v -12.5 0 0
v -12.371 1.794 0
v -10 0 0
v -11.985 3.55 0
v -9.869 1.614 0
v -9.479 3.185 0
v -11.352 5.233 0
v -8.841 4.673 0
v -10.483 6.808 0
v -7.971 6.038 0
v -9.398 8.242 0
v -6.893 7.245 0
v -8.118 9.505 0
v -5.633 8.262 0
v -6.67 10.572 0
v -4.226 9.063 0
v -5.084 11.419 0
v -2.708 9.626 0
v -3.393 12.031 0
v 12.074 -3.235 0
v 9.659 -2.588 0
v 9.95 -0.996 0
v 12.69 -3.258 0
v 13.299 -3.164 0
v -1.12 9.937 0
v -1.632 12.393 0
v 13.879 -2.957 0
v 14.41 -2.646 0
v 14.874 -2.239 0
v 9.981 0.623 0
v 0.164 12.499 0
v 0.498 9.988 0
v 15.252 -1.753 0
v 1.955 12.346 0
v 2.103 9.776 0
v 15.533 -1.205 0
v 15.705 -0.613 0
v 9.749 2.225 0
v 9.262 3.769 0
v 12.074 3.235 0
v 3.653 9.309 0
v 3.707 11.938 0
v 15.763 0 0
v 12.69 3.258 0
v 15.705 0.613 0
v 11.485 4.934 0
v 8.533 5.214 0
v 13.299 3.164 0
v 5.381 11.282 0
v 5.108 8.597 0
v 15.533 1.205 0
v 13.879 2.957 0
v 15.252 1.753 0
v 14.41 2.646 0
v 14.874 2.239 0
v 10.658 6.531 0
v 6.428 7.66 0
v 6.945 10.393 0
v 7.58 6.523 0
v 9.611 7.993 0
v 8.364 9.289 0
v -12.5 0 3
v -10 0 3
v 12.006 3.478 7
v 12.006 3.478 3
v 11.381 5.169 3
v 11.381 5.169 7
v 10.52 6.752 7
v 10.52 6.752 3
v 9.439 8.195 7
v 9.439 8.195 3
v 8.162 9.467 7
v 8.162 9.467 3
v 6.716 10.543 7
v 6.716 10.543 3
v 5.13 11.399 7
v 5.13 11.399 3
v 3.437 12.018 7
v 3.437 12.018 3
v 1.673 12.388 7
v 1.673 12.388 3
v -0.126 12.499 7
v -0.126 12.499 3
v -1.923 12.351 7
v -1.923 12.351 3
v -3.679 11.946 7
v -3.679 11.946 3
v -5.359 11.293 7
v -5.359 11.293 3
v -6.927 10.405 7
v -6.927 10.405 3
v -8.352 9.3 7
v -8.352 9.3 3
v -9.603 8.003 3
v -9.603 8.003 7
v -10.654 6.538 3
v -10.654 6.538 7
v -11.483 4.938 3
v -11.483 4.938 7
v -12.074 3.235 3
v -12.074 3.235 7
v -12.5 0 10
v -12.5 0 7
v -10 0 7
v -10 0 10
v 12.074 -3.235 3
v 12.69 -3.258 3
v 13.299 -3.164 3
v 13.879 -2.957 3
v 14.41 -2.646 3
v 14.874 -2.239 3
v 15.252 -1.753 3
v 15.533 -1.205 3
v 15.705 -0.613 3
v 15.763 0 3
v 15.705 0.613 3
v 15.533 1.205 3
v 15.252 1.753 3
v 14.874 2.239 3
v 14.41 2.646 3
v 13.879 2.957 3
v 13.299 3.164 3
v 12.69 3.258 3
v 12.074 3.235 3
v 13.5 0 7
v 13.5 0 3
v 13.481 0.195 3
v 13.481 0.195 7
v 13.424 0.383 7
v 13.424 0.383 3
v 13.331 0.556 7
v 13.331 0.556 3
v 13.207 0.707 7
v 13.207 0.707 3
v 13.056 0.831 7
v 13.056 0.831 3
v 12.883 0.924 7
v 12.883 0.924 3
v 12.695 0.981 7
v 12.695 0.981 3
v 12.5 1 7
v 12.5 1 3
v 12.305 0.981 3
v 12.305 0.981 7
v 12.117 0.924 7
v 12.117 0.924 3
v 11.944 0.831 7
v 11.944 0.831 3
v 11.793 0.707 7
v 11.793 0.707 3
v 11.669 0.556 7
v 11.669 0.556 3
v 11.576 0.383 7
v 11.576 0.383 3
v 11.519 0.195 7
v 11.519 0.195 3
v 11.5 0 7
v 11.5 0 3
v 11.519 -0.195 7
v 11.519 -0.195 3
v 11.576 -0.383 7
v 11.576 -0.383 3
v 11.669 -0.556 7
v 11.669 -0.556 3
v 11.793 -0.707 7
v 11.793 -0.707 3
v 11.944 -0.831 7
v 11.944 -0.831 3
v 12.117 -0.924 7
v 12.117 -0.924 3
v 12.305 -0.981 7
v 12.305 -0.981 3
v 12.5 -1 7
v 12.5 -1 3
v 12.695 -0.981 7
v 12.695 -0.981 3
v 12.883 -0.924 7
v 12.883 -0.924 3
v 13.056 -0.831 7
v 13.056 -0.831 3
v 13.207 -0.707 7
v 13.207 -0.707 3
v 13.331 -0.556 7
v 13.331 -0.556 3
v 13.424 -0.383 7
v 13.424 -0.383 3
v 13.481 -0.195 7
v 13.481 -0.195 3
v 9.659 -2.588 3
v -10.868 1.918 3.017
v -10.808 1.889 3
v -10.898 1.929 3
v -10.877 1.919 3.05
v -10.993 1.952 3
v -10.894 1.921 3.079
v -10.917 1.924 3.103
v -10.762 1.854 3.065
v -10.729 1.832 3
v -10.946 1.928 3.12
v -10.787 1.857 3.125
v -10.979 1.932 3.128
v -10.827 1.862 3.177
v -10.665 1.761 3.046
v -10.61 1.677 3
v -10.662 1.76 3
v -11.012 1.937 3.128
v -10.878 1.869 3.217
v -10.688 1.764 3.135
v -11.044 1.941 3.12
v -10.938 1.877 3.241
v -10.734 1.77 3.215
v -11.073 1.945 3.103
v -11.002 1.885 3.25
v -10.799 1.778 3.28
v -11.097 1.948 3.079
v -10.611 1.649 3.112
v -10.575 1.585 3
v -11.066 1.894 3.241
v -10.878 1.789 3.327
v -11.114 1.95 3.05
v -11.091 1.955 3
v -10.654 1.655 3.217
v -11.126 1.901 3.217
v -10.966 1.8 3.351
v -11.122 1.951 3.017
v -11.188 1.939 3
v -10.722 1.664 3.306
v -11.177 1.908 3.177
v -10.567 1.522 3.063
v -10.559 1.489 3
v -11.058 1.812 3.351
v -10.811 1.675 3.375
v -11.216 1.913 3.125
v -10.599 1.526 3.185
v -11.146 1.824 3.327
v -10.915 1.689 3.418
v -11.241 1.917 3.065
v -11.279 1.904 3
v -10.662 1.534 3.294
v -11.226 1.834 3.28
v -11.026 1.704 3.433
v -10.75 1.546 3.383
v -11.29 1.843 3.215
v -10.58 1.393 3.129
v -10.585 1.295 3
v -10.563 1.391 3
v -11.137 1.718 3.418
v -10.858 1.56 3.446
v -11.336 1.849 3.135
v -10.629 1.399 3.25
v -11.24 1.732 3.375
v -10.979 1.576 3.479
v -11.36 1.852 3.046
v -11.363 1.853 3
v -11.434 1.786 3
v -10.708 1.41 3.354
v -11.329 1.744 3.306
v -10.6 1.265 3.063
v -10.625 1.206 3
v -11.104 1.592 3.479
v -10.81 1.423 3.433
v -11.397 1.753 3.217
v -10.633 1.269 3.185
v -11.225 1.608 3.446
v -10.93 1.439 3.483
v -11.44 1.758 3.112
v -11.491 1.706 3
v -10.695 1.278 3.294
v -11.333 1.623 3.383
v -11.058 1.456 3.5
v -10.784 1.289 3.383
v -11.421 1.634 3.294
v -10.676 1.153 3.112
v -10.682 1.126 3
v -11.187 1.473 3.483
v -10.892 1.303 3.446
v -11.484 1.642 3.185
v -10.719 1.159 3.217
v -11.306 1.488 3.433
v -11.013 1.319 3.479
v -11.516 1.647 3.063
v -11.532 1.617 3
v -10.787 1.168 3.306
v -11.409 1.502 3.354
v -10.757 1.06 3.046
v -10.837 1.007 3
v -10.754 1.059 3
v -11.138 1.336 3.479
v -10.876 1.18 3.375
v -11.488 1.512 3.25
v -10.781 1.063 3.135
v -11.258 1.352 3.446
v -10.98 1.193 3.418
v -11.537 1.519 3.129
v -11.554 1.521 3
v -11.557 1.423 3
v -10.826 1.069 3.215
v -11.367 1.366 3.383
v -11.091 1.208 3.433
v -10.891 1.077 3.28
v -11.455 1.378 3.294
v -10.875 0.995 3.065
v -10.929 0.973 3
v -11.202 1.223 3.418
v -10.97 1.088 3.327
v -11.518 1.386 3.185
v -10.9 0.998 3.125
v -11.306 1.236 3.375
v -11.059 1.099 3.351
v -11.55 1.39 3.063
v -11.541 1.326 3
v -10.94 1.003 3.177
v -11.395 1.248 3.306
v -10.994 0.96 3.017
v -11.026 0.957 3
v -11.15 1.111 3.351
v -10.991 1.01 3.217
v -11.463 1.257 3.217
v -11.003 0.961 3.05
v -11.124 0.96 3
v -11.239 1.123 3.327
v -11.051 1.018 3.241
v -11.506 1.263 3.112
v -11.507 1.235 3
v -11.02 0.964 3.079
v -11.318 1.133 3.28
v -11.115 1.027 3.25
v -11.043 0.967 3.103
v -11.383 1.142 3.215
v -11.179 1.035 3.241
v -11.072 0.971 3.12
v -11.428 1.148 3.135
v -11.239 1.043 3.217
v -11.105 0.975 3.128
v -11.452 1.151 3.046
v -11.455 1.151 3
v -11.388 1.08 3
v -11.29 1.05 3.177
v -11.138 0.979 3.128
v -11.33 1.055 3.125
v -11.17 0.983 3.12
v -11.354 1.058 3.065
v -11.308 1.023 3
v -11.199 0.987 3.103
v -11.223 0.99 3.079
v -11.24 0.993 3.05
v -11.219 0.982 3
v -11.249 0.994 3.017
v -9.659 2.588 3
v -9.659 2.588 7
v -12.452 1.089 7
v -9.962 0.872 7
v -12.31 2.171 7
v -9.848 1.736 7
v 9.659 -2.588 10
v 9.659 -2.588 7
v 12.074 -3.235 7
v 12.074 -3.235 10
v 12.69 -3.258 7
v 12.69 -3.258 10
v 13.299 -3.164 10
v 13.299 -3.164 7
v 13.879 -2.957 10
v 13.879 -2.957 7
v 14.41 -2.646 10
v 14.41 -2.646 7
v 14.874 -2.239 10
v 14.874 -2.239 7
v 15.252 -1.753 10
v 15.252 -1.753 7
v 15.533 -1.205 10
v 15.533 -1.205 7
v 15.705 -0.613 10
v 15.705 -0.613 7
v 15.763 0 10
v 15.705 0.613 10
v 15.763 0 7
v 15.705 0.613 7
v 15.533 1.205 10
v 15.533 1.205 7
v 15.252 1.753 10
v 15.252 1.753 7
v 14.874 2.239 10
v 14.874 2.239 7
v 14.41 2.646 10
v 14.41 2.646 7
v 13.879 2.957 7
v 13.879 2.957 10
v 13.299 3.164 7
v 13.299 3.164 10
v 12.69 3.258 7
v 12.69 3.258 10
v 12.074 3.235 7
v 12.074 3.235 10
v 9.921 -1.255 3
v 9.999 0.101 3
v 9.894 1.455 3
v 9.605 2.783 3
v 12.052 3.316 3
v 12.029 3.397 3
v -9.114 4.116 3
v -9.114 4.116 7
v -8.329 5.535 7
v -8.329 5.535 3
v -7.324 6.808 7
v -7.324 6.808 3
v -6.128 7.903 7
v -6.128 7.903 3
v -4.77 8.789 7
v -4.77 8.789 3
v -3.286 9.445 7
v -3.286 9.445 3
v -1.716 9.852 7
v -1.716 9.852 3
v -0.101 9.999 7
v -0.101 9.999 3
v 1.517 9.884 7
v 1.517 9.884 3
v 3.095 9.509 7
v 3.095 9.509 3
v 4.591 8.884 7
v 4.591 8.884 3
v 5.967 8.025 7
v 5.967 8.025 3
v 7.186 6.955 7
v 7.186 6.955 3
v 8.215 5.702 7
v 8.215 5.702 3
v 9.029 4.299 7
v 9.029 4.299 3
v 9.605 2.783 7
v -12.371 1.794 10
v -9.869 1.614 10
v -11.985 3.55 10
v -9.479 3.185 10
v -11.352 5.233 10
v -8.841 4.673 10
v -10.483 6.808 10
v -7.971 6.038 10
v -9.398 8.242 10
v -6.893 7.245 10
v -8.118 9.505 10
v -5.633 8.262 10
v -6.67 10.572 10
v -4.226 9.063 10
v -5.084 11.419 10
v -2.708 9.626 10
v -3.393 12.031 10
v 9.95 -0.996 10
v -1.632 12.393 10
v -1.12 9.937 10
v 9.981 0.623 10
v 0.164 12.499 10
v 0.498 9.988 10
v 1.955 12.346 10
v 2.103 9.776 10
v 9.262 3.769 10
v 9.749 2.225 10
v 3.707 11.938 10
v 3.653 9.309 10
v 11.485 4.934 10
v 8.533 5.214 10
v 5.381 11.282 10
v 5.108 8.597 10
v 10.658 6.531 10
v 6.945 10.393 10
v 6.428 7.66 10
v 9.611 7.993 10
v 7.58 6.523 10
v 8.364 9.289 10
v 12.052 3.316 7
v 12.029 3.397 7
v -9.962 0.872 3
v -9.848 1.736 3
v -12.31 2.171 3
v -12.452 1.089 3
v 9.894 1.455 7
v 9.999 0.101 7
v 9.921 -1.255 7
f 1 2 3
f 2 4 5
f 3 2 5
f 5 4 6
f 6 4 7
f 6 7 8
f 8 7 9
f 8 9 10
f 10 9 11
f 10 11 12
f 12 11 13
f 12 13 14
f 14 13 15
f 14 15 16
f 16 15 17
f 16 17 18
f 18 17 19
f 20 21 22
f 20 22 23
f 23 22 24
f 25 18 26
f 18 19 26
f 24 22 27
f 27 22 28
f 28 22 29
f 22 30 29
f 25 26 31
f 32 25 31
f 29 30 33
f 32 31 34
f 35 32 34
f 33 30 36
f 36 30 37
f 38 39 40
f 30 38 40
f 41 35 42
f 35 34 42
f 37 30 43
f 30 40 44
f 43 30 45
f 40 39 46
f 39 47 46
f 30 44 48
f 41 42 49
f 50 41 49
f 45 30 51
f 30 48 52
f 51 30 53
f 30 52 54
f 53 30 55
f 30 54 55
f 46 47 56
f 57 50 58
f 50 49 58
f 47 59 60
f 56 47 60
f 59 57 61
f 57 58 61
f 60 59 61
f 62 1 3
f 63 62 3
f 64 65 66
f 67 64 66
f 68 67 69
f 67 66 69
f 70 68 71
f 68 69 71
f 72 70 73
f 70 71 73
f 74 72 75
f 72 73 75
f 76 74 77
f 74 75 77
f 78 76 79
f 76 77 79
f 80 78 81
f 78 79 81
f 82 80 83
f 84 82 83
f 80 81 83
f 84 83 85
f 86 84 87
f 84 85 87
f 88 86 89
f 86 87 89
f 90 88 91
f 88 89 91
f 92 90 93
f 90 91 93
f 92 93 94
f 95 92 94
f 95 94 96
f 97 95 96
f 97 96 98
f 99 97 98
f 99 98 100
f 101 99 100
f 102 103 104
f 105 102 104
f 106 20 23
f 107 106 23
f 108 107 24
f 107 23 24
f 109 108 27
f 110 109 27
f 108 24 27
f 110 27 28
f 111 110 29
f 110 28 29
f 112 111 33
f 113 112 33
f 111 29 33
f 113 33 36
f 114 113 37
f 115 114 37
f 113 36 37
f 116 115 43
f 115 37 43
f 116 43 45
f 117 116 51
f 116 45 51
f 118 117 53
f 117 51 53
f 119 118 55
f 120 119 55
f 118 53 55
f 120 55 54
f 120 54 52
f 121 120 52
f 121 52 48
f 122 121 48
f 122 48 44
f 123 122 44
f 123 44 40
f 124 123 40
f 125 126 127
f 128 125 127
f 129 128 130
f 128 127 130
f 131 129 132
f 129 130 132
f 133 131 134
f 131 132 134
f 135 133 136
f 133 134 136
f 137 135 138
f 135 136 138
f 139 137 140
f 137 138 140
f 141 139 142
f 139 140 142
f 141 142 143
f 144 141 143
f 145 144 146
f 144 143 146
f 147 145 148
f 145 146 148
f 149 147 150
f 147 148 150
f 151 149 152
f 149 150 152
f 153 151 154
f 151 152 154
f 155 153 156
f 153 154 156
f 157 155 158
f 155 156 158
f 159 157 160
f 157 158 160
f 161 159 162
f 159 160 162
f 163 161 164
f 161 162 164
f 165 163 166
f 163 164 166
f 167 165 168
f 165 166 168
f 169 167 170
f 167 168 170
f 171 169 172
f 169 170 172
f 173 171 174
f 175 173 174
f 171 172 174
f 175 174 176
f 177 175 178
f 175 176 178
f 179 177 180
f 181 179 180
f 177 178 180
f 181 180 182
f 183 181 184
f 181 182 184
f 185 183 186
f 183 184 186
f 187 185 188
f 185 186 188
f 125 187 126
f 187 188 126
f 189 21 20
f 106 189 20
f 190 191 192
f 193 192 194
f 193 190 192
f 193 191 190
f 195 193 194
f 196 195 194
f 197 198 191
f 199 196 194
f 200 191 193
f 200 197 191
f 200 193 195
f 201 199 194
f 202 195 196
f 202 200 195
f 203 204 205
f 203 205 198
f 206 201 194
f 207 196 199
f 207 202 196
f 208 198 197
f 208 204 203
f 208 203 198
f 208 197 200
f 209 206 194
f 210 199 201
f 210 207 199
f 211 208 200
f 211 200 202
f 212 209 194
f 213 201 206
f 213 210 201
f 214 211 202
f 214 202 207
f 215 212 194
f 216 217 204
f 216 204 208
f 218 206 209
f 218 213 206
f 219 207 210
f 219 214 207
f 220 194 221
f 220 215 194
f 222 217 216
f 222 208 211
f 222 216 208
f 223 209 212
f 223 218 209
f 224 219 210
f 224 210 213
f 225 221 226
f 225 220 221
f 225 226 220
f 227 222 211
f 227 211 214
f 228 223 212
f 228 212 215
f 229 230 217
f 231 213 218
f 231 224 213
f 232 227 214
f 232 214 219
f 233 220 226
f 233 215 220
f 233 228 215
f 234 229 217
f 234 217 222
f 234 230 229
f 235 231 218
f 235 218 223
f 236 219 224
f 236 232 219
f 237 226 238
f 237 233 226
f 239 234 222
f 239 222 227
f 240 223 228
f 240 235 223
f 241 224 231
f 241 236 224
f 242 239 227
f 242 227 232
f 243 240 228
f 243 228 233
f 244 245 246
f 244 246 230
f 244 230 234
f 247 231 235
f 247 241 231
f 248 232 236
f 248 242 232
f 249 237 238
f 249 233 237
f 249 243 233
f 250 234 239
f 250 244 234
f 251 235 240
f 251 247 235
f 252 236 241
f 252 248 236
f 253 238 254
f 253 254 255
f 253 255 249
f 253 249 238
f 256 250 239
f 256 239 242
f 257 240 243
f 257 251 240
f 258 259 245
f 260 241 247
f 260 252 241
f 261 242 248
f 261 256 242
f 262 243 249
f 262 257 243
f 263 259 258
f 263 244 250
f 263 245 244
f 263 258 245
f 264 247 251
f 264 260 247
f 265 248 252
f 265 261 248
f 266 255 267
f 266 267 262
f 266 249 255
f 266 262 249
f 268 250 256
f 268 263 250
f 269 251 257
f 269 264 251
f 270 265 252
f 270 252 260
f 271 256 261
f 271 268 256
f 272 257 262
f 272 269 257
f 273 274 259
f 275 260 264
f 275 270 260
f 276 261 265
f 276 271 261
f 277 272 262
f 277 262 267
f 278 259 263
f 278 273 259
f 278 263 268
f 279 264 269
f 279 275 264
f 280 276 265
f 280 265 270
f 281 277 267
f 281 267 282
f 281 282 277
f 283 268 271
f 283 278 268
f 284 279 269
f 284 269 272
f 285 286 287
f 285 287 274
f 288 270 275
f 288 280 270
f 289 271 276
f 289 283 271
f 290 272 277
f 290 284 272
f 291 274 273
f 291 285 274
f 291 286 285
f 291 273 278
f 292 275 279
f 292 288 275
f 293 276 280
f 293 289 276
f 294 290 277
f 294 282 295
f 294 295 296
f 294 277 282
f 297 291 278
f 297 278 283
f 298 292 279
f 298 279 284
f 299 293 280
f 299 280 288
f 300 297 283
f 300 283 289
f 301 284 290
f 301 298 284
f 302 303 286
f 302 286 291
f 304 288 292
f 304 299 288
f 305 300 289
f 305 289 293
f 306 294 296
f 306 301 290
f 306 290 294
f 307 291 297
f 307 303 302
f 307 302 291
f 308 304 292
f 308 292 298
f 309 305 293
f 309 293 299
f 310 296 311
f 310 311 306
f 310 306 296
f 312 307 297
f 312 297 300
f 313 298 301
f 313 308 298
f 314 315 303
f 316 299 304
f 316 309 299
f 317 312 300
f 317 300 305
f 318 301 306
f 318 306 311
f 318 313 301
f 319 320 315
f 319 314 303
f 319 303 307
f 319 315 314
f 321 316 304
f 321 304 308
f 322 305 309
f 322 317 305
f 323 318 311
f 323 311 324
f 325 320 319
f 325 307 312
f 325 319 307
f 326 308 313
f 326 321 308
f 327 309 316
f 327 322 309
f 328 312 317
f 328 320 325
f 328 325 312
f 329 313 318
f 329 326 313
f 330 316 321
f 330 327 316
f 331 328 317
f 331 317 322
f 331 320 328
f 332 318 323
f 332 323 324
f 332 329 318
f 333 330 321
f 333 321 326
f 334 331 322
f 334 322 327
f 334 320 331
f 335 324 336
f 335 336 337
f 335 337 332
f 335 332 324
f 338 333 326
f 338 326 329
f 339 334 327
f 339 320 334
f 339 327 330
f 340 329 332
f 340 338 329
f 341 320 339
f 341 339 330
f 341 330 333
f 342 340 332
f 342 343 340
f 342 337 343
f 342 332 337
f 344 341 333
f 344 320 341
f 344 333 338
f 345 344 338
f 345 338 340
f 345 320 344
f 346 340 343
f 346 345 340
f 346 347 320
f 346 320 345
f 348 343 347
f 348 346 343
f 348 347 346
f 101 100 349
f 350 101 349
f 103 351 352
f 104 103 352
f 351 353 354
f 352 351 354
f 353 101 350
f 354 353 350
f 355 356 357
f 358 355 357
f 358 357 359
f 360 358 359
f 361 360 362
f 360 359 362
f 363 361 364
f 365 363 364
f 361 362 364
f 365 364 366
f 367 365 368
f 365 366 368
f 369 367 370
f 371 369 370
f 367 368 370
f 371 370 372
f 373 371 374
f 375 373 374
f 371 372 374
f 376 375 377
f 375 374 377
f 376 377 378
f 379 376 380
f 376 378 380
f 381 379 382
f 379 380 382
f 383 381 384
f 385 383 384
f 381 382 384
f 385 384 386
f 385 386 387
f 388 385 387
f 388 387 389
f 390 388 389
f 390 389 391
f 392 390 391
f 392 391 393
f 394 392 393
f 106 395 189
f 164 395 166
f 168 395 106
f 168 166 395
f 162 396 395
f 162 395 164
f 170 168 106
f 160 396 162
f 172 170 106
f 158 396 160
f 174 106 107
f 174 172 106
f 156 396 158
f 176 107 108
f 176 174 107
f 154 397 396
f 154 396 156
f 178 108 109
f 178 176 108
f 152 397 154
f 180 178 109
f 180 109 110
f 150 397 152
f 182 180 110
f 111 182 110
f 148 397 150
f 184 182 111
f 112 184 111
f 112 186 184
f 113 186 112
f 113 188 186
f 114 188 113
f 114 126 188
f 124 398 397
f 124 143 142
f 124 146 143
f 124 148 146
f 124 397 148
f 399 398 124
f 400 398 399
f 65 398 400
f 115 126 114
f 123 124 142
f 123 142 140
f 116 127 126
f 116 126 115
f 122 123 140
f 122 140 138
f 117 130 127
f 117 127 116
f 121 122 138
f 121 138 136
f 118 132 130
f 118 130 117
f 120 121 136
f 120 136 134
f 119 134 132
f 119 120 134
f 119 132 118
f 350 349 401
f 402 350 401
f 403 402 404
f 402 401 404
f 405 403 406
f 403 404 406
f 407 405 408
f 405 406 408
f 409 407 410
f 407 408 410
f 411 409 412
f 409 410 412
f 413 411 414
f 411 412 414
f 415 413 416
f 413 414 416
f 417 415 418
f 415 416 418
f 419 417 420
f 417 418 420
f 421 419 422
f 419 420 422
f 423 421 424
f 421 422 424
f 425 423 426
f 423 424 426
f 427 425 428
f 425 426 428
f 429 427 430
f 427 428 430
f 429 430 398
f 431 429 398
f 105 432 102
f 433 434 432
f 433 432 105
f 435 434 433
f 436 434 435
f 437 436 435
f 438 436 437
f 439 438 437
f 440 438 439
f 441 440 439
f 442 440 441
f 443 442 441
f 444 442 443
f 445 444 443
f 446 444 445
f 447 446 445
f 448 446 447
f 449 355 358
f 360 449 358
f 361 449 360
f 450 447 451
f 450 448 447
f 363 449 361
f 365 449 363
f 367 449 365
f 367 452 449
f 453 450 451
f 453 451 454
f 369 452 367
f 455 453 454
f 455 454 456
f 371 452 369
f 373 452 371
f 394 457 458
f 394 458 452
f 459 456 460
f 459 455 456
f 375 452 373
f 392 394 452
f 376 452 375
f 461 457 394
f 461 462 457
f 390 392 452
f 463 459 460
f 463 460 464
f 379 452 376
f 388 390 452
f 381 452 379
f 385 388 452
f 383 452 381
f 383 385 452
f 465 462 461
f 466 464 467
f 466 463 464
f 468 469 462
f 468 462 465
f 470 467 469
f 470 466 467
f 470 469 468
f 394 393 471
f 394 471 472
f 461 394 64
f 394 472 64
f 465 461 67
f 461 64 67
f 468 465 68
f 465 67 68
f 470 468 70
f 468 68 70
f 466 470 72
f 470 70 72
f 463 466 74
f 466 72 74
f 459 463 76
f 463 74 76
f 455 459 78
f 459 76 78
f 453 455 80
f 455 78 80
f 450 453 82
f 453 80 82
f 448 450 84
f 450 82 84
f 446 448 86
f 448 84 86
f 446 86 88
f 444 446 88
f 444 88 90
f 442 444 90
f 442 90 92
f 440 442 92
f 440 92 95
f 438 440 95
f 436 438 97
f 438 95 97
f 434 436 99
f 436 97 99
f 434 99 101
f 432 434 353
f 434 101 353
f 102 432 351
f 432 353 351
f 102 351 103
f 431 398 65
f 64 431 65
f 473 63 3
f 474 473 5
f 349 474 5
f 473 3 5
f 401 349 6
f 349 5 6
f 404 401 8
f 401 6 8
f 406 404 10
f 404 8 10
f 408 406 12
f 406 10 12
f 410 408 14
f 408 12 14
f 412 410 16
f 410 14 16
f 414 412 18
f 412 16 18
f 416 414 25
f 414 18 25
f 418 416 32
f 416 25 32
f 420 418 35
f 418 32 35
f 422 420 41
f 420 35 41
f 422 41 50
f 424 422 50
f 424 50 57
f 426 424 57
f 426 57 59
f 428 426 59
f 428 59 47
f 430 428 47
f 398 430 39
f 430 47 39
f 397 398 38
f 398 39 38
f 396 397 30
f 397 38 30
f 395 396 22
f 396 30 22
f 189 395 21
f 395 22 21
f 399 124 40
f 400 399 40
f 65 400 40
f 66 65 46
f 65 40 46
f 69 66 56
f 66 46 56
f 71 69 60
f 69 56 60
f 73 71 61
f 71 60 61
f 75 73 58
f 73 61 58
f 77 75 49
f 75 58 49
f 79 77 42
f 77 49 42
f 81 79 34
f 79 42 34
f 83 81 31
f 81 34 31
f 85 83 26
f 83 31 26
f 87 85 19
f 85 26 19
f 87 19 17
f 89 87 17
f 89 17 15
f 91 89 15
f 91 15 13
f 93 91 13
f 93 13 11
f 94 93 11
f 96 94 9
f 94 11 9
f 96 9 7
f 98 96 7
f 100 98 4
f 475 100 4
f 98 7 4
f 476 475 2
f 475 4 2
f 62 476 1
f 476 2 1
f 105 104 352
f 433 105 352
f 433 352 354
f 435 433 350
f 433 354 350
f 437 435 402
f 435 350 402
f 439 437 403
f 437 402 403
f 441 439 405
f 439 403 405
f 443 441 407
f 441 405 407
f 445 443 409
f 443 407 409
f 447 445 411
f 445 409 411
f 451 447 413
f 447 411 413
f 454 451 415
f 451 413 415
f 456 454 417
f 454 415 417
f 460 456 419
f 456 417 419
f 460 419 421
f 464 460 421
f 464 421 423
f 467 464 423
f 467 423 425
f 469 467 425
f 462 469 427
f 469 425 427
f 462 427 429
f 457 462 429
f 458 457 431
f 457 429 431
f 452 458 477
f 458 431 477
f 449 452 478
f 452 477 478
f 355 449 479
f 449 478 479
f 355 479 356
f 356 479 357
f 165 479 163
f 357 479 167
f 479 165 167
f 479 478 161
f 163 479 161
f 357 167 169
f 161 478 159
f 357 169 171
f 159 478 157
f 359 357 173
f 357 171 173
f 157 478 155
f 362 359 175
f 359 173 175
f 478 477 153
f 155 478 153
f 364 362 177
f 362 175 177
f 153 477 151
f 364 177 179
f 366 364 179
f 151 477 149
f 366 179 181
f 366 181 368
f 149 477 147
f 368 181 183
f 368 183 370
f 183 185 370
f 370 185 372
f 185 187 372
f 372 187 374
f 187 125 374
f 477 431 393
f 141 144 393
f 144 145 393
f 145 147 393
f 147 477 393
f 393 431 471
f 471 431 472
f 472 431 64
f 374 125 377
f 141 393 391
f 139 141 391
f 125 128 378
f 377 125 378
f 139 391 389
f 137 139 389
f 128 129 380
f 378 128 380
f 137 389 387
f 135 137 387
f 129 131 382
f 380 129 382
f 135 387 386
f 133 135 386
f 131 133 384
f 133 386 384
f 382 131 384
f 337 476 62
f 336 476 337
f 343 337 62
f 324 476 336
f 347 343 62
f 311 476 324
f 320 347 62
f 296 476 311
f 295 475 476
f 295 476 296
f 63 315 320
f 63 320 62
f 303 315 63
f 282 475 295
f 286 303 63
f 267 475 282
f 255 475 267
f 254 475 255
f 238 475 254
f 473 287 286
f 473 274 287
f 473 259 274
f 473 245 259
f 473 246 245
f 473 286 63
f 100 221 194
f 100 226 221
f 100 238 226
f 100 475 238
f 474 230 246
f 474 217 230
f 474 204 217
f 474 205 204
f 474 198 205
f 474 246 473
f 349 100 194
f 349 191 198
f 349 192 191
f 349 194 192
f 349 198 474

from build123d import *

# Parameters (mm, degrees)
F1_DEPTH = 3
F2_R     = 1
F3_DEPTH = 4
F5_DEPTH = 3


with BuildPart() as f1:
    # F0 (on Top) → F1 (new body)
    with BuildSketch(Plane.XY):
        with BuildLine():
            Line((9.6592582629, -2.588190451), (12.0740728286, -3.2352380638))
            ThreePointArc((12.0740728286, -3.2352380638), (12.5, 0), (12.0740728286, 3.2352380638))
            ThreePointArc((12.0740728286, 3.2352380638), (-1.6315774028, 12.3930607672), (-12.5, 0))
            Line((-12.5, 0), (-10, 0))
            ThreePointArc((-10, 0), (1.3052619222, 9.9144486137), (9.6592582629, -2.588190451))
        make_face()
        with BuildLine():
            ThreePointArc((12.0740728286, 3.2352380638), (12.5, 0), (12.0740728286, -3.2352380638))
            ThreePointArc((12.0740728286, -3.2352380638), (15.7631548055, 0), (12.0740728286, 3.2352380638))
        make_face()
    extrude(amount=F1_DEPTH)

    # F2 (on face) → F3 (join)
    with BuildSketch(Plane.XY.offset(3)):
        with Locations((12.5, 0)):
            Circle(F2_R)
        with BuildLine():
            Line((-12.0740728286, 3.2352380638), (-9.6592582629, 2.588190451))
            ThreePointArc((-9.6592582629, 2.588190451), (-0.100929954, 9.9994906442), (9.605047786, 2.7826349075))
            Line((9.605047786, 2.7826349075), (12.0063097325, 3.4782936344))
            ThreePointArc((12.0063097325, 3.4782936344), (-0.1261624425, 12.4993633053), (-12.0740728286, 3.2352380638))
        make_face()
    extrude(amount=F3_DEPTH)

    # F4 (on face) → F5 (join)
    with BuildSketch(Plane.XY.offset(7)):
        with BuildLine():
            Line((9.6592582629, -2.588190451), (12.0740728286, -3.2352380638))
            ThreePointArc((12.0740728286, -3.2352380638), (12.5, 0), (12.0740728286, 3.2352380638))
            ThreePointArc((12.0740728286, 3.2352380638), (-1.6315774028, 12.3930607672), (-12.5, 0))
            Line((-12.5, 0), (-10, 0))
            ThreePointArc((-10, 0), (1.3052619222, 9.9144486137), (9.6592582629, -2.588190451))
        make_face()
        with BuildLine():
            ThreePointArc((12.0740728286, 3.2352380638), (12.5, 0), (12.0740728286, -3.2352380638))
            ThreePointArc((12.0740728286, -3.2352380638), (15.7631548055, 0), (12.0740728286, 3.2352380638))
        make_face()
    extrude(amount=F5_DEPTH)

    # F6 (on face) → F7 (revolve)
    with BuildSketch(Plane.XY.offset(3)):
        with BuildLine():
            Line((-11.123595869, 0.960134698), (-10.9930696768, 1.9515795594))
            ThreePointArc((-10.9930696768, 1.9515795594), (-11.5540552036, 1.5211202248), (-11.123595869, 0.960134698))
        make_face()
    revolve(axis=Axis((-11.0583327729, 1.4558571287, 3), (-0.1305261922, -0.9914448614, 0)))


solid = f1.part
